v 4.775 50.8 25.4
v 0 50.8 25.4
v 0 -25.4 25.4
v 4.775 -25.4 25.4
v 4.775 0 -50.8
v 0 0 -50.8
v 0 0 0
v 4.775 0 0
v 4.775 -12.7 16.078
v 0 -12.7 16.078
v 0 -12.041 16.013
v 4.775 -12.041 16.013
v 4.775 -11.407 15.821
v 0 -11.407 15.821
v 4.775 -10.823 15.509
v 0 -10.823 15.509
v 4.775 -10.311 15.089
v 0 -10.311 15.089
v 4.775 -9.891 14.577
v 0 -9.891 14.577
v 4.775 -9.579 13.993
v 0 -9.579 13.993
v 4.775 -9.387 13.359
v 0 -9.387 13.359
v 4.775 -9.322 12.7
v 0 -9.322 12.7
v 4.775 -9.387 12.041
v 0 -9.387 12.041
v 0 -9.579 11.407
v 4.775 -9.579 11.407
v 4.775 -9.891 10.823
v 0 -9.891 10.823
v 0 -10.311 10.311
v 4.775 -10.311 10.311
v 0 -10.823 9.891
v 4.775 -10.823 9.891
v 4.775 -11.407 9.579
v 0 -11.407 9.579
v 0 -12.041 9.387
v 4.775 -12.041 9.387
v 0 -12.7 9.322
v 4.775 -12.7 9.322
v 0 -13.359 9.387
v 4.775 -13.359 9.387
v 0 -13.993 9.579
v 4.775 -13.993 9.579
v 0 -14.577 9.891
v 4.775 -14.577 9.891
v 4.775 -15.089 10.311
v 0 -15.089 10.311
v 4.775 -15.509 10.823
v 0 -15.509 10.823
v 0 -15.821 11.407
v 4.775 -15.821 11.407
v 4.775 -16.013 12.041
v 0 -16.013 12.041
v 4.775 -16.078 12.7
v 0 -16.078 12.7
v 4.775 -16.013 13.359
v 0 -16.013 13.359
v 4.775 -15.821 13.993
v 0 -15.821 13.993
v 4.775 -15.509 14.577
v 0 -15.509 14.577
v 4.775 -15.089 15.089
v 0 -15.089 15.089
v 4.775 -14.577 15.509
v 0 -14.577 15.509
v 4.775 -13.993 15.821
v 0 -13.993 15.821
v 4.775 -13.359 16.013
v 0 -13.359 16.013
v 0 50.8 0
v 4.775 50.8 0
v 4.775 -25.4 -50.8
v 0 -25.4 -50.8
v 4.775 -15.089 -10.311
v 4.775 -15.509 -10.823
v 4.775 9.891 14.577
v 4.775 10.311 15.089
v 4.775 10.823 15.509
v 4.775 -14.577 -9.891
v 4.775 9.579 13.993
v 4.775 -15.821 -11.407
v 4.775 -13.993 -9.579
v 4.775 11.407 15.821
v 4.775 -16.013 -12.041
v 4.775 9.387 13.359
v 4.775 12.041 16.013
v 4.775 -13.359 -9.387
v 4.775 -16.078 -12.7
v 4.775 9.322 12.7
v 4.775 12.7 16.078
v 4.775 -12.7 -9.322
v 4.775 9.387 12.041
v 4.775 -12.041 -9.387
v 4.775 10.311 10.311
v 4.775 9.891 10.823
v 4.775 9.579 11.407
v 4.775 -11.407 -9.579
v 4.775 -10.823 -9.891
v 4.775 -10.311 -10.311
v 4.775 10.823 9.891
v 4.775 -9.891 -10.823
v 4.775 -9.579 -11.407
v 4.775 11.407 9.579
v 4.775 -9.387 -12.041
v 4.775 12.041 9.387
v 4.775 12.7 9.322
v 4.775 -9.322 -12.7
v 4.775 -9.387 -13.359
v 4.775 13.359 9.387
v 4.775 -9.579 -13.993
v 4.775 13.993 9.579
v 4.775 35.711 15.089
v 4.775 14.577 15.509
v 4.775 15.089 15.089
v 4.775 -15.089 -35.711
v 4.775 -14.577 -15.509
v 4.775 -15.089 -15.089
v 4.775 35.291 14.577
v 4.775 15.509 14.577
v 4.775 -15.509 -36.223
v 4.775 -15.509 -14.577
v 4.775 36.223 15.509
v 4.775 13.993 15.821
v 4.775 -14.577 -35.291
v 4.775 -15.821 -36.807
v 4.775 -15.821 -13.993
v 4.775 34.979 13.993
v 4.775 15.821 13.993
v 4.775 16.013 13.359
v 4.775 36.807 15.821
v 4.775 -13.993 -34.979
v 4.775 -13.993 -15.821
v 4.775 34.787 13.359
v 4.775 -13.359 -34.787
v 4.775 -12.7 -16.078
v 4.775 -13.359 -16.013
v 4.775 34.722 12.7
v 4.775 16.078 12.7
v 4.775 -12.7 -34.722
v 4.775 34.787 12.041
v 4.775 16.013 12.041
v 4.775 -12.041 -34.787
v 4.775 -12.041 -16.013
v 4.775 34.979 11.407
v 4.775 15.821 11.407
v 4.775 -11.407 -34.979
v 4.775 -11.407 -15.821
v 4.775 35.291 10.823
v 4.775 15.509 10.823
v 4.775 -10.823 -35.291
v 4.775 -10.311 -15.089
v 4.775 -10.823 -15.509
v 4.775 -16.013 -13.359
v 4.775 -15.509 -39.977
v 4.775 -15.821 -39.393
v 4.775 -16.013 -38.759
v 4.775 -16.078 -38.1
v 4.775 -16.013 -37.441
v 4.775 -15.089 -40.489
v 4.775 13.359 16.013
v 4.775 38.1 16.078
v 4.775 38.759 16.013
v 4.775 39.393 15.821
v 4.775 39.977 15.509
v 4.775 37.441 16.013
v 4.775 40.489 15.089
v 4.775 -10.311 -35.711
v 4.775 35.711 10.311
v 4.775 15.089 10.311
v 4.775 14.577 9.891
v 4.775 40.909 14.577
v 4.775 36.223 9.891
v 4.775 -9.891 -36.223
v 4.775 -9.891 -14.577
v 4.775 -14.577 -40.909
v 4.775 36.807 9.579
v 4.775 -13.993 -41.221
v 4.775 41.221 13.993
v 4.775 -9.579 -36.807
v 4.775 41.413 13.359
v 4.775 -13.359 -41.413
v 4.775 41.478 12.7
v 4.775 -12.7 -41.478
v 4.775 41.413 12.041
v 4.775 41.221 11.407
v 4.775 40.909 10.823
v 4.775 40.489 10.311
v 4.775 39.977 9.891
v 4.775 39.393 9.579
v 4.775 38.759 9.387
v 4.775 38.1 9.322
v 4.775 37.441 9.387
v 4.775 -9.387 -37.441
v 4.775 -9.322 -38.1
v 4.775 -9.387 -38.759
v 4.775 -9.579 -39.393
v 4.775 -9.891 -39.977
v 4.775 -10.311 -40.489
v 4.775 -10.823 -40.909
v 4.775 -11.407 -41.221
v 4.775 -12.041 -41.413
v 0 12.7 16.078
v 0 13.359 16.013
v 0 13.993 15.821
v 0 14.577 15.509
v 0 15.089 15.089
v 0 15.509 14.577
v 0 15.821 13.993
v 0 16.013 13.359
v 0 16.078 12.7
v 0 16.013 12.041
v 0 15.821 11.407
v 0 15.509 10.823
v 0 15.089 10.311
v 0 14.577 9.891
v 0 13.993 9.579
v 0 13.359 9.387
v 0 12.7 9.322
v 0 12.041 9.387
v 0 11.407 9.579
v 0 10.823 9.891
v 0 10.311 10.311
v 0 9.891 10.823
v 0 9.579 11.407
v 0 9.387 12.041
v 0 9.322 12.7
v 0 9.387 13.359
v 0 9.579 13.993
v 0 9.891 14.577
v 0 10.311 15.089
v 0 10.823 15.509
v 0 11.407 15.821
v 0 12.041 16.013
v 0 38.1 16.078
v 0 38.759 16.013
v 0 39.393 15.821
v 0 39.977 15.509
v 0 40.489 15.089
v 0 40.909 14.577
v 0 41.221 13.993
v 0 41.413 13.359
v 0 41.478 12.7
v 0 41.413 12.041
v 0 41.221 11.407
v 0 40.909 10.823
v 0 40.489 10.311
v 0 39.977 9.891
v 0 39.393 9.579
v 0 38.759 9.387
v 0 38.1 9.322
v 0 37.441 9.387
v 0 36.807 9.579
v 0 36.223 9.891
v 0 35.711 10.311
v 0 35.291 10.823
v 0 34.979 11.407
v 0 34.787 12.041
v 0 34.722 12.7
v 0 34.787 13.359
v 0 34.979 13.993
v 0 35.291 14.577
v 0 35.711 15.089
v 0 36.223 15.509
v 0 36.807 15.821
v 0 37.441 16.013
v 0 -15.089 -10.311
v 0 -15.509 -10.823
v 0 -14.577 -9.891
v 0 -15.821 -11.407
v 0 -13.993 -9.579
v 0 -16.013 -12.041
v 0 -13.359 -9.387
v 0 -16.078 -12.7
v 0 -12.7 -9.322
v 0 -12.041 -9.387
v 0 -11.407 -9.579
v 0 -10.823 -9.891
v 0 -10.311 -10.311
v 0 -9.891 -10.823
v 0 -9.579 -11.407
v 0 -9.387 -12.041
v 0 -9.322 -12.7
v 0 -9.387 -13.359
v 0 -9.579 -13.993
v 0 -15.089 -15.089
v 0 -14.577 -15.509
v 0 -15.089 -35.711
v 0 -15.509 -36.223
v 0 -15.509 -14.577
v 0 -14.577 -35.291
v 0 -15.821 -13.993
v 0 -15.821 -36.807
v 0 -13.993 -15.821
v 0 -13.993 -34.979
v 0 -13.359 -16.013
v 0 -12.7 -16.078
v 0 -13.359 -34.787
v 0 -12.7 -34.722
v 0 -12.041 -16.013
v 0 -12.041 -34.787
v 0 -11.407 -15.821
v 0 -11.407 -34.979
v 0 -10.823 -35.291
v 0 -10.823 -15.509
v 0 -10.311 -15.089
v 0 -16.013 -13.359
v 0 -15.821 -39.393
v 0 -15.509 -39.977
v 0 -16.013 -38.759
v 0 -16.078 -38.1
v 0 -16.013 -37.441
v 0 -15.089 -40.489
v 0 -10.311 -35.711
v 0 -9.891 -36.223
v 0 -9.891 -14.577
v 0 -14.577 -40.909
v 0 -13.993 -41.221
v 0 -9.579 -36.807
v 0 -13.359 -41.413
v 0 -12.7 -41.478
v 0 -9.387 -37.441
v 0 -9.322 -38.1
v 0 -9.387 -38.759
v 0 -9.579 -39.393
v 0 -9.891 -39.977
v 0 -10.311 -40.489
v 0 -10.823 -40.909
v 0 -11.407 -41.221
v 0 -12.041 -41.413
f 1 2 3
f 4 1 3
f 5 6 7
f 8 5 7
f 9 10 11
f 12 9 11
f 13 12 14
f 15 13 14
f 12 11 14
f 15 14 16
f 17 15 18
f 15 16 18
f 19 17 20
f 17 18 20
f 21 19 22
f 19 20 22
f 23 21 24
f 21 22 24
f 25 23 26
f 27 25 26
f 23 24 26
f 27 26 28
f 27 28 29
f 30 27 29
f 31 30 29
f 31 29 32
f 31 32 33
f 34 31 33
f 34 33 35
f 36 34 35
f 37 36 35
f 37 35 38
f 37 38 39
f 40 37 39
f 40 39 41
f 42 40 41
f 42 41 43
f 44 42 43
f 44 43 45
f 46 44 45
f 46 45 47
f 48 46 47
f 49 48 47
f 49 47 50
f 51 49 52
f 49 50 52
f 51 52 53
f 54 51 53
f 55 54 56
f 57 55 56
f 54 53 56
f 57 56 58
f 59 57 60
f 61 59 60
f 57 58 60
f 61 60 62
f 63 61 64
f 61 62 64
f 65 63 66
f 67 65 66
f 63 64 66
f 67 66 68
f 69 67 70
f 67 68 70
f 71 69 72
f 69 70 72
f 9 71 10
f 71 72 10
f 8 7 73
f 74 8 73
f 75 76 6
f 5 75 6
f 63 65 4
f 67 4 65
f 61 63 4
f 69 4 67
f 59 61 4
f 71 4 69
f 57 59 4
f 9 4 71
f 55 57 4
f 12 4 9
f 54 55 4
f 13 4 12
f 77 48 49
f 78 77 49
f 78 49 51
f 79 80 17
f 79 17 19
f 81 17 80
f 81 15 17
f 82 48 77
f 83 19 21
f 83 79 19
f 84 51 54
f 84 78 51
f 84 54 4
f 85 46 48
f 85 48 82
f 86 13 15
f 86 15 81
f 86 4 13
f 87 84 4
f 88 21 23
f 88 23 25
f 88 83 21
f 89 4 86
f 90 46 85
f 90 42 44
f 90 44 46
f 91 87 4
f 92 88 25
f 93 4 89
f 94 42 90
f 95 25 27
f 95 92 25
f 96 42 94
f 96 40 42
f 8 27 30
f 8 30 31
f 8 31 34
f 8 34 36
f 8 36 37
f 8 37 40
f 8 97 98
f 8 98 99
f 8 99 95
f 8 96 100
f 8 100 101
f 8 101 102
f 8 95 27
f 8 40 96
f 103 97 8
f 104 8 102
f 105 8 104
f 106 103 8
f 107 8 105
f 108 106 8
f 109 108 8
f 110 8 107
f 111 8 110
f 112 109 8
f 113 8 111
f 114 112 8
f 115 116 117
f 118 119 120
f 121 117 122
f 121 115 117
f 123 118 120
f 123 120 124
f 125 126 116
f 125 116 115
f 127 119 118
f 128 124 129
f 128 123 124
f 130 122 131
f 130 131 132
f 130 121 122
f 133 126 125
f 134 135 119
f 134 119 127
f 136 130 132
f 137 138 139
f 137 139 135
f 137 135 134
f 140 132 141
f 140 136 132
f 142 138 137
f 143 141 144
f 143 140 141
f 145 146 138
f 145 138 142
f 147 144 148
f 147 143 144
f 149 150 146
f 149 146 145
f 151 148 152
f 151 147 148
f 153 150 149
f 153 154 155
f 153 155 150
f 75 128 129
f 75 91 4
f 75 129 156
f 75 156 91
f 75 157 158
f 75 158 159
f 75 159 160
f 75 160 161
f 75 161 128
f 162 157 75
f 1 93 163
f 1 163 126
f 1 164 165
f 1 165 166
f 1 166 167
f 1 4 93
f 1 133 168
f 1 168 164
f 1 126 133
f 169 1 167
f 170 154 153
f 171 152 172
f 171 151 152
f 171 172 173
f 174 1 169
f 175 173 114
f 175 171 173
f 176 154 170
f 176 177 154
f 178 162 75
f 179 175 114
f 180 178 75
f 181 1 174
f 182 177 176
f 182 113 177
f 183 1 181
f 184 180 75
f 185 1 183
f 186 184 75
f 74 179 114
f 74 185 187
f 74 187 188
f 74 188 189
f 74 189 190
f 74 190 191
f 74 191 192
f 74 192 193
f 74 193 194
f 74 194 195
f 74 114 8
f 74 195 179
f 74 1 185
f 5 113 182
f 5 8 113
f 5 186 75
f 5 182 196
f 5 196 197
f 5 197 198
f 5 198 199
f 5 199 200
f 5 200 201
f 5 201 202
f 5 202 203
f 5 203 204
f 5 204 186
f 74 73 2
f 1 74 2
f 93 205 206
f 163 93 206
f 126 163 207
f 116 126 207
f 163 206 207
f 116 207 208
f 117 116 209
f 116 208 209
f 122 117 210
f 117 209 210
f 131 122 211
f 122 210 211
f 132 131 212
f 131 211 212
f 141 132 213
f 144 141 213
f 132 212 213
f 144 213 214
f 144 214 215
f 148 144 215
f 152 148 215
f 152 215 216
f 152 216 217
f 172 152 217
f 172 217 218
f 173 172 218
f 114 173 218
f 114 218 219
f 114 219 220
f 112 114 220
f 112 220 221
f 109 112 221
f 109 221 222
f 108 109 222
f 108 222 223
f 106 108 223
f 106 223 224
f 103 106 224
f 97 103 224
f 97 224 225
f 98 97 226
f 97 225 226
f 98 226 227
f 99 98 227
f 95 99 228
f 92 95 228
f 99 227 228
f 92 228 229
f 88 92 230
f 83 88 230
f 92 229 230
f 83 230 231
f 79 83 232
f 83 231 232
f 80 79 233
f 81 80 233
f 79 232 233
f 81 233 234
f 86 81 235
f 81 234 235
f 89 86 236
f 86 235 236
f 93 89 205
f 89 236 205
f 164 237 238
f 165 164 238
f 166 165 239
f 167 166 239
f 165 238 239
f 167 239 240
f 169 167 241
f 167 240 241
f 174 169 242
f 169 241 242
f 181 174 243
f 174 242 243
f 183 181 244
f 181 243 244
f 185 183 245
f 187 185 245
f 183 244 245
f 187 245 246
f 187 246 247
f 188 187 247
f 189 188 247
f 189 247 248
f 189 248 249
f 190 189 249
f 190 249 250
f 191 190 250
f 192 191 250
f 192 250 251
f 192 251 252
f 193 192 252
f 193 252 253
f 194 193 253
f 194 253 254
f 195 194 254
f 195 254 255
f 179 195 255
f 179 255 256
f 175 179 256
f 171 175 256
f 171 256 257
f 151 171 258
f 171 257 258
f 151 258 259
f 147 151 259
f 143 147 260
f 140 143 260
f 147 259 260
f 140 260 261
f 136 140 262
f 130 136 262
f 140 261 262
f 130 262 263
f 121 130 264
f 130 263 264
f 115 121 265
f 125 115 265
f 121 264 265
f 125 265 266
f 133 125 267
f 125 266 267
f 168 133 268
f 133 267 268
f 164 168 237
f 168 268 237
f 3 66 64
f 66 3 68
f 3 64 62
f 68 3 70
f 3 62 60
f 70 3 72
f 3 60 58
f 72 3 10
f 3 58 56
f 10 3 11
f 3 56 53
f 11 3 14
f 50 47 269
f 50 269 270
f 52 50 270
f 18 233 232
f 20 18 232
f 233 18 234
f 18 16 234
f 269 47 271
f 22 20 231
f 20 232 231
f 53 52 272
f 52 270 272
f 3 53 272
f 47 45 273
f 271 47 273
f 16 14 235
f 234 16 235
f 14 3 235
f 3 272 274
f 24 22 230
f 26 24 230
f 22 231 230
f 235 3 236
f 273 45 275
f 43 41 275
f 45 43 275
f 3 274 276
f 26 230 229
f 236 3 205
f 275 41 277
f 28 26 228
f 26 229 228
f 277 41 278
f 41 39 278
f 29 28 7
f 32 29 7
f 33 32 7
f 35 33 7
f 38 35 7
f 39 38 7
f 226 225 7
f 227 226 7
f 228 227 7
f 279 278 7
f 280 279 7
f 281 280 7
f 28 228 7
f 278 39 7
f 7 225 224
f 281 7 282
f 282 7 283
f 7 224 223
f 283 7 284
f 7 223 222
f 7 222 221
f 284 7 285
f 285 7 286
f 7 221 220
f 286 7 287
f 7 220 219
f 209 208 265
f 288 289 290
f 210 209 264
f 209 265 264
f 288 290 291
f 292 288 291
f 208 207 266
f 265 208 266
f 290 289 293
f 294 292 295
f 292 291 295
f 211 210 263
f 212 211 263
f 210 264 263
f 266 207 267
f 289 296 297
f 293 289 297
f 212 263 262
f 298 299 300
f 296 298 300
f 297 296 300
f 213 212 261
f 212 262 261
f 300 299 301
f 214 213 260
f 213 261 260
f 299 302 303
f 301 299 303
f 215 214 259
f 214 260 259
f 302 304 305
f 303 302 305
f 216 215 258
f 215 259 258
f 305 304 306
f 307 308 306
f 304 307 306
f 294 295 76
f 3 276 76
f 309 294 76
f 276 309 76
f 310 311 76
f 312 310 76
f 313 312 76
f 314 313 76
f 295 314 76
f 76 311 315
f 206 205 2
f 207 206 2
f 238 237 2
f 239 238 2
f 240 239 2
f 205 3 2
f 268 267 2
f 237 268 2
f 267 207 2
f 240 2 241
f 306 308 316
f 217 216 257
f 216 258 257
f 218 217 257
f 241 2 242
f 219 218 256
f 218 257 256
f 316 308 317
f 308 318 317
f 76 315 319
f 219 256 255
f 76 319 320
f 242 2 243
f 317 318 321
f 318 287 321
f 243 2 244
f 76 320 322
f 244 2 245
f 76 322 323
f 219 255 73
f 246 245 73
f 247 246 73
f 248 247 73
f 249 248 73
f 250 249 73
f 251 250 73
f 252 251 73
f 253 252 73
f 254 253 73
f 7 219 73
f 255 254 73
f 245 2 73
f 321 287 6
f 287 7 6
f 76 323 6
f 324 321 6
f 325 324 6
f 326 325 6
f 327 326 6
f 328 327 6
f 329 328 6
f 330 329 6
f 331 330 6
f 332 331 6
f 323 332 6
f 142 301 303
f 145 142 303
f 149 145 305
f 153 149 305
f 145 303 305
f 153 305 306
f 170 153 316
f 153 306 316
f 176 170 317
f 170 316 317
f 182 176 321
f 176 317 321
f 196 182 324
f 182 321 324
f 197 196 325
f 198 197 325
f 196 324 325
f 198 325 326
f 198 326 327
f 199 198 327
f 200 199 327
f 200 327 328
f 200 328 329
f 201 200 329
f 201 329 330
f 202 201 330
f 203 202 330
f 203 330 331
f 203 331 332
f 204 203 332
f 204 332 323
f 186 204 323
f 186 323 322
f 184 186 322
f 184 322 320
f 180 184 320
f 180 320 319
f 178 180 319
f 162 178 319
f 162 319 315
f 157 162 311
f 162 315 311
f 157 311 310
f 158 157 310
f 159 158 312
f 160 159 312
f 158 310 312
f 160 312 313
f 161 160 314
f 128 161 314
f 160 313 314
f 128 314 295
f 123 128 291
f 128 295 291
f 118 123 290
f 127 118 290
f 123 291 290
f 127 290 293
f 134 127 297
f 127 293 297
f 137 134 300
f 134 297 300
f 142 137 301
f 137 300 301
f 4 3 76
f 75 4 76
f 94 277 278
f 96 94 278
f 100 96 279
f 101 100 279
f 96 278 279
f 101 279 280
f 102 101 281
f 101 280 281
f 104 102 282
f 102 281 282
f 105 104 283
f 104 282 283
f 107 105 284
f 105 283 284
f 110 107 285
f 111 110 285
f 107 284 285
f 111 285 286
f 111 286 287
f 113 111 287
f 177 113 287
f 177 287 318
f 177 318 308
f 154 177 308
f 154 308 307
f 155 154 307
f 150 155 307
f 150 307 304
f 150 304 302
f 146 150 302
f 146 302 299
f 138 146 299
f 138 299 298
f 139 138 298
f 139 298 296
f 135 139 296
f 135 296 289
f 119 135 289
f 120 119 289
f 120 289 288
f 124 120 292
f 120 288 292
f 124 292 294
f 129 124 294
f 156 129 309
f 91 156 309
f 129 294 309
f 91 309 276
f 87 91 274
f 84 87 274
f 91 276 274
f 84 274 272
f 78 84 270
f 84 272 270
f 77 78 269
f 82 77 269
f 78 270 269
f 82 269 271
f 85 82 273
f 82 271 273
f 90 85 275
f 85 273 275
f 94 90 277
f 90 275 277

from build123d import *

# Parameters (mm, degrees)
BOSS_EXTRUDE1_DEPTH         = 4.7752
F_1_4_CLEARANCE_HOLE1_D     = 6.7564
F_1_4_CLEARANCE_HOLE1_DEPTH = 14.478
F_1_4_CLEARANCE_HOLE1_TIP   = 2.029827343


with BuildPart() as part:
    # Sketch1 → Boss-Extrude1 (new body)
    with BuildSketch(Plane(origin=(0, 0, 0), x_dir=(0, 0, -1), z_dir=(1, 0, 0))):
        Polygon((0, 0), (0, 50.8), (-25.4, 50.8), (-25.4, -25.4), (50.8, -25.4), (50.8, 0), align=None)
    extrude(amount=BOSS_EXTRUDE1_DEPTH)

    # 1/4 Clearance Hole1
    with Locations(Plane(origin=(4.7752, 0, 0), x_dir=(0, 0, -1), z_dir=(1, 0, 0))):
        with Locations((-12.7, -12.7), (12.7, -12.7), (38.1, -12.7), (-12.7, 12.7), (-12.7, 38.1)):
            Hole(F_1_4_CLEARANCE_HOLE1_D / 2, depth=F_1_4_CLEARANCE_HOLE1_DEPTH)
            with Locations((0, 0, -(F_1_4_CLEARANCE_HOLE1_DEPTH + F_1_4_CLEARANCE_HOLE1_TIP / 2))):  # 118° drill point
                Cone(0, F_1_4_CLEARANCE_HOLE1_D / 2, F_1_4_CLEARANCE_HOLE1_TIP, mode=Mode.SUBTRACT)


solid = part.part
